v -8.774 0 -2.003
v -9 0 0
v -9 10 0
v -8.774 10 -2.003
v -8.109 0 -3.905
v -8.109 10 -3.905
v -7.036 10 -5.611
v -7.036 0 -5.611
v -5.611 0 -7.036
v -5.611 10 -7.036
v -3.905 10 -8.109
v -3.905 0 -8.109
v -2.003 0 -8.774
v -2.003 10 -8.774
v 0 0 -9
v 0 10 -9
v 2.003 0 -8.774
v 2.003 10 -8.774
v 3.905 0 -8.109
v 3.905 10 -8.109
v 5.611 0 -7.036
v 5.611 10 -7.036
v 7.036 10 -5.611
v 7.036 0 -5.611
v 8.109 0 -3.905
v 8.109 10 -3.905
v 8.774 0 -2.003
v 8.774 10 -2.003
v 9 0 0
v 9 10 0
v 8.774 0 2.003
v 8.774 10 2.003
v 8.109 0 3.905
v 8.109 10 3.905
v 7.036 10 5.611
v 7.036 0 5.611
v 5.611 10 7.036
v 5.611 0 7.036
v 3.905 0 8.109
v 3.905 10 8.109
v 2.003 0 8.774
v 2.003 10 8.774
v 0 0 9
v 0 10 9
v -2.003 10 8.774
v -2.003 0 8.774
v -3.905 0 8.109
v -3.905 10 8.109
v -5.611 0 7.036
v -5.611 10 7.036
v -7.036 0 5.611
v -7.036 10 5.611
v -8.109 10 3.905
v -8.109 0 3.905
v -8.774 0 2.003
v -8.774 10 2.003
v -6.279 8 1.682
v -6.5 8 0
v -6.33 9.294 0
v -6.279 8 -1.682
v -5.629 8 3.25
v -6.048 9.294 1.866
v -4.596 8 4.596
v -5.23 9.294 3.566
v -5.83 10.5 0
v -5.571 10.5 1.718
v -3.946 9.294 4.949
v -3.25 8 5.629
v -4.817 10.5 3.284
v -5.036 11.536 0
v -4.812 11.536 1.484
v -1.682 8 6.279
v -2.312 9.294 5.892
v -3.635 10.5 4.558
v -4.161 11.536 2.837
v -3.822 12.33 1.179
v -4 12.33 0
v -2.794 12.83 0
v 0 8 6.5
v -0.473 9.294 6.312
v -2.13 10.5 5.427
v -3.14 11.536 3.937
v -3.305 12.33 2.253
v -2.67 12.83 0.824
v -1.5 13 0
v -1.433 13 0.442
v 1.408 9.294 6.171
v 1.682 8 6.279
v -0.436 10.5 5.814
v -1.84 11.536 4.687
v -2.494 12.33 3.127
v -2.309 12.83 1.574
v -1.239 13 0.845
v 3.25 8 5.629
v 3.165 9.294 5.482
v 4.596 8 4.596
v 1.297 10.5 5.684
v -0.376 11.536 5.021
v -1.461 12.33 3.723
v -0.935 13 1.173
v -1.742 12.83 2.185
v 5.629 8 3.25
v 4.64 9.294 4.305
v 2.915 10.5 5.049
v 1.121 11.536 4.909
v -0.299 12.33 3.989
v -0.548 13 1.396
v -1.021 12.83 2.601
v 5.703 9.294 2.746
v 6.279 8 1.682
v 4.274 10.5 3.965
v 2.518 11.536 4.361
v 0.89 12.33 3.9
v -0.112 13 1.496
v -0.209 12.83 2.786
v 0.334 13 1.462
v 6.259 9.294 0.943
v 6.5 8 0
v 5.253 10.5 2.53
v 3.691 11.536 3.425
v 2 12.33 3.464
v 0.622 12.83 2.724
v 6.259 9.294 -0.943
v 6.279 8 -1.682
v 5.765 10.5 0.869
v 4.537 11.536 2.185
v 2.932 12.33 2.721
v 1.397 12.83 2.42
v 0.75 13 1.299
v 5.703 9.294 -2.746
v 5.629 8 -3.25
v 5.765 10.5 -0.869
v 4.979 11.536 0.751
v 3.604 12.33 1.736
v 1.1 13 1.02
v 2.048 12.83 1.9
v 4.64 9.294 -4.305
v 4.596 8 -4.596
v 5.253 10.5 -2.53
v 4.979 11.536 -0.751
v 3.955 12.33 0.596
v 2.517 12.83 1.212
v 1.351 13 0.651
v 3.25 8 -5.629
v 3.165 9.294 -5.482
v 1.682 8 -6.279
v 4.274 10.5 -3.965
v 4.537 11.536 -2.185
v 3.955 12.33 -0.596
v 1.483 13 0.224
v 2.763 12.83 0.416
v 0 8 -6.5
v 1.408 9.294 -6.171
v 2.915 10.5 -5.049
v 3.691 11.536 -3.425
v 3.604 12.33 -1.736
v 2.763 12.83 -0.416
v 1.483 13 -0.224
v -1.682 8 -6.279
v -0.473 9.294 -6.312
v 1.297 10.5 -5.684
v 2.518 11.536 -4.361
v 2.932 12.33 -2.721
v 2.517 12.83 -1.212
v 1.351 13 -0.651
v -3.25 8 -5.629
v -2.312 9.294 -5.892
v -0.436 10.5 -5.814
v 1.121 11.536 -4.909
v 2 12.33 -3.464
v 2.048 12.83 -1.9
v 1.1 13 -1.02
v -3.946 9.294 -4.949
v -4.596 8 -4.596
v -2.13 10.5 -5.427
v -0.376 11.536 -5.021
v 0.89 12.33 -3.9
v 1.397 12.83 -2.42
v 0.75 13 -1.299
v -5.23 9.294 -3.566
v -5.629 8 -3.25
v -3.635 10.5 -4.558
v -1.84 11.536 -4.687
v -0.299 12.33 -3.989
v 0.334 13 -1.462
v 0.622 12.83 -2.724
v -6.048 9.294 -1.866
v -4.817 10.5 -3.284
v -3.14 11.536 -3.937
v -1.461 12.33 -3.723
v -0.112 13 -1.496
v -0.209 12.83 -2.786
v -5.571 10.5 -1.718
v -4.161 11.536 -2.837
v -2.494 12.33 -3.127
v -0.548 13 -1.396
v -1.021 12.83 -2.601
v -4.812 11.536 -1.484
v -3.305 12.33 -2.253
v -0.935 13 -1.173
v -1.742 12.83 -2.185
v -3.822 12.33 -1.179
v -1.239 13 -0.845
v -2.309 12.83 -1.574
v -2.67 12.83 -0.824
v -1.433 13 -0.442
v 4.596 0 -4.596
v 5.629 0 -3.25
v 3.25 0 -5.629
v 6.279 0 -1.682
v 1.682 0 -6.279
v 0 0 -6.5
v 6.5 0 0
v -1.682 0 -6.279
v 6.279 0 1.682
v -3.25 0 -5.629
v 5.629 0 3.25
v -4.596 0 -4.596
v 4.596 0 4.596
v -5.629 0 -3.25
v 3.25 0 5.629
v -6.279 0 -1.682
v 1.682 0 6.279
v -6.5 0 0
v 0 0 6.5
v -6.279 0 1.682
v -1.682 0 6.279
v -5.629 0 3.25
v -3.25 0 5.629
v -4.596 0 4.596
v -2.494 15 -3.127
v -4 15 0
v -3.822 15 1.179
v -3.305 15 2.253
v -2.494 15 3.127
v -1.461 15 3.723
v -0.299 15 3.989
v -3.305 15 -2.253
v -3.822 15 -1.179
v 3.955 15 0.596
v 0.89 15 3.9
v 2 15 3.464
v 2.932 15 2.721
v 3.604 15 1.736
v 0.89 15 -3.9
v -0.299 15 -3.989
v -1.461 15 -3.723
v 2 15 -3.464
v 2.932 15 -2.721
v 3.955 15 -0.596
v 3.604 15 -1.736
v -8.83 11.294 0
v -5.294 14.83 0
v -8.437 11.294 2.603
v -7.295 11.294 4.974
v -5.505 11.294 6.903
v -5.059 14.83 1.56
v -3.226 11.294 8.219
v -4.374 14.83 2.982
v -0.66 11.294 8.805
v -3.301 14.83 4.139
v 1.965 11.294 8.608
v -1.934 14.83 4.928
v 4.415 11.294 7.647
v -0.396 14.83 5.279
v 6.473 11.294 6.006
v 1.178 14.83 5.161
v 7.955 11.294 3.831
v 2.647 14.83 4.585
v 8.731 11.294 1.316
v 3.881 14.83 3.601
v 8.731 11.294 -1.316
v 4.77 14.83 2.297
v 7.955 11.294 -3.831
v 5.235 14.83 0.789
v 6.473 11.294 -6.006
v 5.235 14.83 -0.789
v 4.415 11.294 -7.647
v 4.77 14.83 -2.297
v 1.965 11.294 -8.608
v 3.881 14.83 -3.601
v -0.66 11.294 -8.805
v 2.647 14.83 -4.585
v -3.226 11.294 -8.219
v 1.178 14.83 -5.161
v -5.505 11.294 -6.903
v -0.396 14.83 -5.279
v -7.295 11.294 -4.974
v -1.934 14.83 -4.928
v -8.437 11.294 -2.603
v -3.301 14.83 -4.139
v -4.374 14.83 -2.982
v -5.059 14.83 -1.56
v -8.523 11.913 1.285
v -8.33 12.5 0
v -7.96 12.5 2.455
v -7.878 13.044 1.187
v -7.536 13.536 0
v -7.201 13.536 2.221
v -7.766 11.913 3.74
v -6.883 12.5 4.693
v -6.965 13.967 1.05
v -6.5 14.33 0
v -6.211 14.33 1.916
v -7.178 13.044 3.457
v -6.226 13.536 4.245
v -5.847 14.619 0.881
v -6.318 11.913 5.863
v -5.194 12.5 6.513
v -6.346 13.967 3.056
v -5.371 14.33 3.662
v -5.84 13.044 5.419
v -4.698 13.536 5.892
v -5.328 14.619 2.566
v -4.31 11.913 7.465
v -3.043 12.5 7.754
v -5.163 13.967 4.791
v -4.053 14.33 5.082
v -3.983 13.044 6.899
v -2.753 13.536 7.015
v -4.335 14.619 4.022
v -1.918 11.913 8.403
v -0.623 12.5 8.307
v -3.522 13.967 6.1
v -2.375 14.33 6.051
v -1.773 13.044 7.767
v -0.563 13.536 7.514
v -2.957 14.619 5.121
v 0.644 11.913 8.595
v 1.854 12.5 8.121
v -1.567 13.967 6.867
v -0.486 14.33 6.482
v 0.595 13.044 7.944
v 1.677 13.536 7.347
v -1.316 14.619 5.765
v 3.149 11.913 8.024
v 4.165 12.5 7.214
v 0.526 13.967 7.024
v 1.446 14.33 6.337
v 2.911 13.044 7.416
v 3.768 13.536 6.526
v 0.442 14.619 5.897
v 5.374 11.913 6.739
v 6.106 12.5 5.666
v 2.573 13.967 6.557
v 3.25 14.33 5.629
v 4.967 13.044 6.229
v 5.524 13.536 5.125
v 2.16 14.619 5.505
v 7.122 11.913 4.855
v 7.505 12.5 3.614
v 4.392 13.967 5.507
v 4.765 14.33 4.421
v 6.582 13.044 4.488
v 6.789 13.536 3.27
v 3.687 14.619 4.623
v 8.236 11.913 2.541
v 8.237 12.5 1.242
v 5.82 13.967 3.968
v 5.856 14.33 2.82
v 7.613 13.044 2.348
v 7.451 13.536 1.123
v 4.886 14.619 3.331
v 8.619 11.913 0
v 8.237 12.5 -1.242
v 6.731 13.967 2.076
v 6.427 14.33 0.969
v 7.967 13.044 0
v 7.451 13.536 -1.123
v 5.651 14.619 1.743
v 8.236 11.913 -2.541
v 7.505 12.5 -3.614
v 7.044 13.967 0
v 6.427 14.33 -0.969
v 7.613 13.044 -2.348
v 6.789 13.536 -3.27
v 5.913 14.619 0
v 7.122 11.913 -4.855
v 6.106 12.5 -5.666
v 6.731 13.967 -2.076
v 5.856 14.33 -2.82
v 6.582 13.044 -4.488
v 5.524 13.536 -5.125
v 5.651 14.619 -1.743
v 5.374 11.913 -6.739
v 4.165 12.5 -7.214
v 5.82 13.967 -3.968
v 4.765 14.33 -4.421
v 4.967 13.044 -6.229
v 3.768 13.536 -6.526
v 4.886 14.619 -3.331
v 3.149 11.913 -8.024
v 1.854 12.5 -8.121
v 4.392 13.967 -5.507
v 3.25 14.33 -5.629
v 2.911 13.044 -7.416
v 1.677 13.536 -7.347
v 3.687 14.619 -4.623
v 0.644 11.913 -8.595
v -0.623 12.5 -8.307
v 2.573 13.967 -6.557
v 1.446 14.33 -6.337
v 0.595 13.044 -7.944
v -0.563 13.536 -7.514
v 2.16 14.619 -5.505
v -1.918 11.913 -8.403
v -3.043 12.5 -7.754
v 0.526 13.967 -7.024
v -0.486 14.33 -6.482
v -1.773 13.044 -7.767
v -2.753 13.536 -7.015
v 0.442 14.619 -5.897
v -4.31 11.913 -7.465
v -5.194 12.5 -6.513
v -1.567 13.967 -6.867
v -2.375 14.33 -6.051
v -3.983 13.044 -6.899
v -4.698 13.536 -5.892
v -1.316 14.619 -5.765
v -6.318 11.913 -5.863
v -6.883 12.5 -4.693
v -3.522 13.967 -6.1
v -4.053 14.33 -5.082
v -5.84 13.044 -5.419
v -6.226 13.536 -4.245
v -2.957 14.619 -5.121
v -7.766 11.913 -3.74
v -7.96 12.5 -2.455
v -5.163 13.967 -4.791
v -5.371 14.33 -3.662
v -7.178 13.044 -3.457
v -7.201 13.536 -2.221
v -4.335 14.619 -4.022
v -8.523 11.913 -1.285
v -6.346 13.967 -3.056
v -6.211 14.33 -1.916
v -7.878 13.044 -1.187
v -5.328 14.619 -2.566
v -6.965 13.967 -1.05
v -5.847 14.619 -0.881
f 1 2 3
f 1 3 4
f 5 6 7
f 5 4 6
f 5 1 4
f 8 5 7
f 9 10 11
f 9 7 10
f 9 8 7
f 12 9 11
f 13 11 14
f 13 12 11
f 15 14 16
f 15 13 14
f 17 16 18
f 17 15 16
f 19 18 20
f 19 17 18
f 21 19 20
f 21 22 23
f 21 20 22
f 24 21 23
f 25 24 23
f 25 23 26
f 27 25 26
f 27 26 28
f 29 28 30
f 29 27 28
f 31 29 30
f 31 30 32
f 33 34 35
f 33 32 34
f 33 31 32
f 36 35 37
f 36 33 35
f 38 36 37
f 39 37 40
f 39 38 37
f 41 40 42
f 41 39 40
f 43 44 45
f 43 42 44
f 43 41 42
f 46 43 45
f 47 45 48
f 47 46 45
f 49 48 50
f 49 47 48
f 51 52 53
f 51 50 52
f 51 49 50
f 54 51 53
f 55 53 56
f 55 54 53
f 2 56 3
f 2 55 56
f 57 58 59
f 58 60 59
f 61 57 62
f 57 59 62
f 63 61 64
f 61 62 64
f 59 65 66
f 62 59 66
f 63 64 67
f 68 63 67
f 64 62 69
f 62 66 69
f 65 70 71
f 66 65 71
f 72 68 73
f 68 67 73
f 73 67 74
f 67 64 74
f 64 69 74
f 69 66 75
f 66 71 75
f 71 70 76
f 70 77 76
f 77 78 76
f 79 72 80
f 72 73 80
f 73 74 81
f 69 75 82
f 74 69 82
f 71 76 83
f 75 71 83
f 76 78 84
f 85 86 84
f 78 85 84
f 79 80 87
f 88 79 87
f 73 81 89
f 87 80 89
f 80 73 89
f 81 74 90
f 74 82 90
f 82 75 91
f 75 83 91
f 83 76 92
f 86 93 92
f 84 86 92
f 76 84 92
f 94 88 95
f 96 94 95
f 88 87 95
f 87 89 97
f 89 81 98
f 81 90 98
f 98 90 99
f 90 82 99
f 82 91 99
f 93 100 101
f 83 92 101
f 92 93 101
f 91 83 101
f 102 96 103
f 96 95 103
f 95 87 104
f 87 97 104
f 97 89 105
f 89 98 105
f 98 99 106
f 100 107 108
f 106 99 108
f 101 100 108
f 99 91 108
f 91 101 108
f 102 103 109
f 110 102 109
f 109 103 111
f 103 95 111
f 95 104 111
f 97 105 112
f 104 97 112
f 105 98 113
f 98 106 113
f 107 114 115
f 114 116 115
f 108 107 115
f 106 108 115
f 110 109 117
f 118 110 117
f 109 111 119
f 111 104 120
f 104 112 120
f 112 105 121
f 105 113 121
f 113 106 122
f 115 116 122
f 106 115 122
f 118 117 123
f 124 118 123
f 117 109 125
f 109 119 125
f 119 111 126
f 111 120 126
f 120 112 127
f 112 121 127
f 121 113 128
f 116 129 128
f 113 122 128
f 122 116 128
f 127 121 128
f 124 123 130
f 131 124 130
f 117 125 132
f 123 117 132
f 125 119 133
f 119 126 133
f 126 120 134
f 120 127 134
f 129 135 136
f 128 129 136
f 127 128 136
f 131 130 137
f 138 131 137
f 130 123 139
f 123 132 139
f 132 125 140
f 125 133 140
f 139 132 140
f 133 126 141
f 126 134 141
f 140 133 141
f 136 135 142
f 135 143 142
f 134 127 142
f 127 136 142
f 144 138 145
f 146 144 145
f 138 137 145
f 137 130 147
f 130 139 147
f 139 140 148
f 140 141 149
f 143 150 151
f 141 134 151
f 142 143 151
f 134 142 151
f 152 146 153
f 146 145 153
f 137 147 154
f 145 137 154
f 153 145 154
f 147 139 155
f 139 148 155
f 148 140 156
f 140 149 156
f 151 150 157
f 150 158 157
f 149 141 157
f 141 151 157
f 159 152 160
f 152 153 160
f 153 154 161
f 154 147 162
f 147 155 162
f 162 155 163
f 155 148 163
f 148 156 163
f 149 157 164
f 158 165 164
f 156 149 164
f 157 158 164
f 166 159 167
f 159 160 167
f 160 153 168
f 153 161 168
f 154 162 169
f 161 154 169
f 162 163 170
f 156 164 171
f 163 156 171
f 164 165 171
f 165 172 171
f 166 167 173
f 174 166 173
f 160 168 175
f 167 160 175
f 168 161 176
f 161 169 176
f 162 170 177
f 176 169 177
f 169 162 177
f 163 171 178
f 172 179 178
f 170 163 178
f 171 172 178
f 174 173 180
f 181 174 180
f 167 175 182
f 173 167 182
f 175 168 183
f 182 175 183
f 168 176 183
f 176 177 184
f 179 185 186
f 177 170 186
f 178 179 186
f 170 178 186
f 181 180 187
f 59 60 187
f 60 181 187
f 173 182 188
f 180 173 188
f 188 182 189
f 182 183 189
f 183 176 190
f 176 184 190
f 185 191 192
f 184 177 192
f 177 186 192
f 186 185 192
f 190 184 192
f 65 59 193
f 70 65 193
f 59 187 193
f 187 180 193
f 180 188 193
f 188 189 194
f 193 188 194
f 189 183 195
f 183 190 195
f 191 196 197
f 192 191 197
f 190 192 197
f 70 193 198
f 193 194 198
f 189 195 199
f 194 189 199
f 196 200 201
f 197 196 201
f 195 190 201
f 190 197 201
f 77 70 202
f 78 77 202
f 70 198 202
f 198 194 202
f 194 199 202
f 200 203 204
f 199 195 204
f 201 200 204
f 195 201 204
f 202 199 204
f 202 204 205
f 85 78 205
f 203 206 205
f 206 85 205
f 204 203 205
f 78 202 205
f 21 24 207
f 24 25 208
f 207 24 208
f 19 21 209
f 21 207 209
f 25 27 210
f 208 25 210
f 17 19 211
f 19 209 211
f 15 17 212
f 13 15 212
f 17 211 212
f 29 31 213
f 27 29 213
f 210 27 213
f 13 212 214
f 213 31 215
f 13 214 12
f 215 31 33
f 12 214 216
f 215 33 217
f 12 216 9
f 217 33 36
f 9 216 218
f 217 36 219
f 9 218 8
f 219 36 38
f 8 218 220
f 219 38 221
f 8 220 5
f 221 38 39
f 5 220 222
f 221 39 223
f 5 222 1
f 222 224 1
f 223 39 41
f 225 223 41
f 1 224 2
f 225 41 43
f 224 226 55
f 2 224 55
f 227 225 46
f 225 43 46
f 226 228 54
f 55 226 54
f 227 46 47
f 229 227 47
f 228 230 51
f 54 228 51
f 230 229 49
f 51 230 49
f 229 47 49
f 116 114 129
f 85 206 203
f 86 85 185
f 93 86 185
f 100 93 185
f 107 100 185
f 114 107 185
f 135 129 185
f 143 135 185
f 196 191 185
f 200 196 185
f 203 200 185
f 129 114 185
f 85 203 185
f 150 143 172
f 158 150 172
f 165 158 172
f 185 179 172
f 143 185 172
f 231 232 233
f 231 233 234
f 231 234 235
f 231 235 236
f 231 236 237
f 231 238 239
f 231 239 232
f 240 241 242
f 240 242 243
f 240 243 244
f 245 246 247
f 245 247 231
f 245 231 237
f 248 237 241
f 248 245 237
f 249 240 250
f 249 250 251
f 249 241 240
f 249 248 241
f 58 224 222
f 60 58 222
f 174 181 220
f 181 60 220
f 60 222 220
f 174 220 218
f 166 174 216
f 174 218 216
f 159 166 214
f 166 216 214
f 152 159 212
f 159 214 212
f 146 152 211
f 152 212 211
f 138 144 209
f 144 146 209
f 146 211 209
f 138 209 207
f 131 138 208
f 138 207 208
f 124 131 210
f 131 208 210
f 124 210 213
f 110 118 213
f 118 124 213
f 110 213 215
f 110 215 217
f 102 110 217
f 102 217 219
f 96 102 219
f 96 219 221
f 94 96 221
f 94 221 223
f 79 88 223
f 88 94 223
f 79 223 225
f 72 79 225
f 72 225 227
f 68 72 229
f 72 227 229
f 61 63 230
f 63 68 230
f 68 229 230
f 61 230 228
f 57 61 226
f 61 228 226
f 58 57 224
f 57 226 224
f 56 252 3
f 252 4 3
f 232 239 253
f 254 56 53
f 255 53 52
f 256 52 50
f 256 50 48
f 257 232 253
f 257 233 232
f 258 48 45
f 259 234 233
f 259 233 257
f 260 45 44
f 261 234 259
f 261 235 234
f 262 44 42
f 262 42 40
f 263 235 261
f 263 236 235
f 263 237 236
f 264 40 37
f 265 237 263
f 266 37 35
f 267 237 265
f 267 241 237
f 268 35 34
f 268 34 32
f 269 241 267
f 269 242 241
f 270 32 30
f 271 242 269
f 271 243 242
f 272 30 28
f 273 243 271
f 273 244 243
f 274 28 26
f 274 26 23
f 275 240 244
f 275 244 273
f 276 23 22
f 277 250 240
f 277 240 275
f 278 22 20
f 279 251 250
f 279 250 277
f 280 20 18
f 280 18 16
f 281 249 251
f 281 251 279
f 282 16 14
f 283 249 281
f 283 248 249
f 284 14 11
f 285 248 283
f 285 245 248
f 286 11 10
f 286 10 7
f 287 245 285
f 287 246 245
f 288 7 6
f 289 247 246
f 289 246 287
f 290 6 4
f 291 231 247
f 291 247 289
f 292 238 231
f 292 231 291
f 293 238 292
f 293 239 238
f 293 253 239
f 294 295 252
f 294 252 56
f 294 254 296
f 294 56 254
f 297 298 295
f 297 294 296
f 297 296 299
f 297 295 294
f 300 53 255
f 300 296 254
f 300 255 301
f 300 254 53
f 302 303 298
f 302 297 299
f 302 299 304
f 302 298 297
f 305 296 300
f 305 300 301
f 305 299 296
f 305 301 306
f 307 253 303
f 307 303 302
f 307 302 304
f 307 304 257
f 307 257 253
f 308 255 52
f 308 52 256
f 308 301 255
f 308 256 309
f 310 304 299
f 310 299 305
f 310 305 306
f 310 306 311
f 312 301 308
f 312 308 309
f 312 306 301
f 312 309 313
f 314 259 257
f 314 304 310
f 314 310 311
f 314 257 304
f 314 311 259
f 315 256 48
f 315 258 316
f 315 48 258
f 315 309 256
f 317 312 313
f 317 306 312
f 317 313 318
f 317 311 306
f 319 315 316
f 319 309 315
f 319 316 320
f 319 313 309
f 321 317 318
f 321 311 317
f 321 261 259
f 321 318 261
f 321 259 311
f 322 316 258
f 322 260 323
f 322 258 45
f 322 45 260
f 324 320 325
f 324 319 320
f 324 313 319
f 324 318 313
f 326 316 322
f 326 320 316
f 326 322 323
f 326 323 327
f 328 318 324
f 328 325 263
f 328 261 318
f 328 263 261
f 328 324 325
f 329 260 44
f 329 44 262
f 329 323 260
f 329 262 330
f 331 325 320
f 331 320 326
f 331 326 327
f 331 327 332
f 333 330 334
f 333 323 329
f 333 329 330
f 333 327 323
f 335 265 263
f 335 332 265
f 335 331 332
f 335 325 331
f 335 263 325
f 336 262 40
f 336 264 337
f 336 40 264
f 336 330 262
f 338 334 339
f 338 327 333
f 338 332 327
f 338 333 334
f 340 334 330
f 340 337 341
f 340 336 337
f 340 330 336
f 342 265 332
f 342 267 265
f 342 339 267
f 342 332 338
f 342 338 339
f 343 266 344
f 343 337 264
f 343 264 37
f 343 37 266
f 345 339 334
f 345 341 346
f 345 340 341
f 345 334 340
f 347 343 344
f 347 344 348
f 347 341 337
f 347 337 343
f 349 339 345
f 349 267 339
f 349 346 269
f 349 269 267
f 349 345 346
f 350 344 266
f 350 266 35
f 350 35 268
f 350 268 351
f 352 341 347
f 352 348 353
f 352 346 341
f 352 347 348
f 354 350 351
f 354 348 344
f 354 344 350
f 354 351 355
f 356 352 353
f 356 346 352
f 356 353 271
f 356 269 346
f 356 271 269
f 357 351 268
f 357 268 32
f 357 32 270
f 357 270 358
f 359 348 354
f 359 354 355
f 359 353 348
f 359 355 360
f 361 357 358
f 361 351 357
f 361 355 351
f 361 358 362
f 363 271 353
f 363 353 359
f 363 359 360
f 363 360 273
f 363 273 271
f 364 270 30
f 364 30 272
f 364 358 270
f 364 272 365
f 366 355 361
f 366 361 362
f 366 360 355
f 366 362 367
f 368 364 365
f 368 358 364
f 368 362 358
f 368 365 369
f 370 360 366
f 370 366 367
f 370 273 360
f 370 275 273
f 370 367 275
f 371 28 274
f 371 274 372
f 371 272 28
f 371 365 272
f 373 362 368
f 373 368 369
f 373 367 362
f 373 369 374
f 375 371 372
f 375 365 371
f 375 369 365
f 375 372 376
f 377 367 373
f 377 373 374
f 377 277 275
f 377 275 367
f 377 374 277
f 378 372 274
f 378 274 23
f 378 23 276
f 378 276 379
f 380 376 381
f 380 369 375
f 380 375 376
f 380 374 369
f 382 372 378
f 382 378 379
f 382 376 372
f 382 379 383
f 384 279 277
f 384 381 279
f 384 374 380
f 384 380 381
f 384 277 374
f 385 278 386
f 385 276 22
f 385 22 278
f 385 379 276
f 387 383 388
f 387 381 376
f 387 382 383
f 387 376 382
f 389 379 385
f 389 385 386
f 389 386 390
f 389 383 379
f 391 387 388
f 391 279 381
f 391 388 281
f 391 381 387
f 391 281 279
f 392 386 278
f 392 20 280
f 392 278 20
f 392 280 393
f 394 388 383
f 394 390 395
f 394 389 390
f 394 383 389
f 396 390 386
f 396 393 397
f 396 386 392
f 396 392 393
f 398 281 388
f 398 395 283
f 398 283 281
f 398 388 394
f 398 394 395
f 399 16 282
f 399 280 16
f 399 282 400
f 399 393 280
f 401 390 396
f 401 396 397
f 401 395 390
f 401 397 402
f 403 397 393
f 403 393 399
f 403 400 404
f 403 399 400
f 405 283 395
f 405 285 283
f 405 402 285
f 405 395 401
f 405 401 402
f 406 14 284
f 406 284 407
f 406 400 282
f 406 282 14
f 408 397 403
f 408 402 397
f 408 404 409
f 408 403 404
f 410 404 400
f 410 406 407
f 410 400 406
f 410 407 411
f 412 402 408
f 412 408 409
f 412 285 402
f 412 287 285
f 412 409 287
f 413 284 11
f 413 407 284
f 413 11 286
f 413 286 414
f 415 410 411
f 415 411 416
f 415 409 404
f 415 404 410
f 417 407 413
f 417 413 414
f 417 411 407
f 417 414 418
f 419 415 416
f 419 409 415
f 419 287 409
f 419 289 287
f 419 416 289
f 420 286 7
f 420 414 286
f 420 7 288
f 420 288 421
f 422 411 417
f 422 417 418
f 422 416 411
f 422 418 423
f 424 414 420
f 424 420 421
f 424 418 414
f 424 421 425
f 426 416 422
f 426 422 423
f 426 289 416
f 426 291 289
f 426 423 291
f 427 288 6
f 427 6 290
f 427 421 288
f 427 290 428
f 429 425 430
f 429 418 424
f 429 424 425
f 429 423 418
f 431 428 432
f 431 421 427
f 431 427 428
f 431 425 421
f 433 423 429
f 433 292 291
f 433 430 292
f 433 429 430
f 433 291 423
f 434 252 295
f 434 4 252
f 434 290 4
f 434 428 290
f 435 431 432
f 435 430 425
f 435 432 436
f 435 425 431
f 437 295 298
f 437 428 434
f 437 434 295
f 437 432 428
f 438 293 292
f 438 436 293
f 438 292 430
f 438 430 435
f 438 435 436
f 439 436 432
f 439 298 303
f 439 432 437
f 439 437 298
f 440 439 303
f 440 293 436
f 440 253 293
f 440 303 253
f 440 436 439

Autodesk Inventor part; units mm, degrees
ref_plane "YZ Plane" through (0, 0, 0) normal (1, 0, 0) x (0, 1, 0)
ref_plane "XZ Plane" through (0, 0, 0) normal (0, 1, 0) x (-1, 0, 0)
ref_plane "XY Plane" through (0, 0, 0) normal (0, 0, 1) x (1, 0, 0)
sketch "스케치1" plane through (0, 0, 0) normal (0, 1, 0) x (-1, 0, 0)
  circle A0 centre (0, 0) radius 6.5
  circle A1 centre (0, 0) radius 9
  dimension "d0" = 13
  dimension "d1" = 18
extrude "돌출1" add sketch "스케치1" along normal blind 13
sketch "스케치2" plane through (0, 13, 0) normal (0, 1, 0) x (1, 0, 0)
  circle A0 centre (0, 0) radius 9 projected
  circle A1 centre (0, 0) radius 6.5 projected
extrude "돌출2" add sketch "스케치2" along normal blind 2 contours A0 | A1
fillet "모깎기1" radius 5 2 edges at (6.5, 13, 0) (-9, 15, 0)
thread "스레드1" size "1 1/2-6 UNC" class "2B" standard "ANSI Unified Screw Threads" length 13
properties part number "부품1"
